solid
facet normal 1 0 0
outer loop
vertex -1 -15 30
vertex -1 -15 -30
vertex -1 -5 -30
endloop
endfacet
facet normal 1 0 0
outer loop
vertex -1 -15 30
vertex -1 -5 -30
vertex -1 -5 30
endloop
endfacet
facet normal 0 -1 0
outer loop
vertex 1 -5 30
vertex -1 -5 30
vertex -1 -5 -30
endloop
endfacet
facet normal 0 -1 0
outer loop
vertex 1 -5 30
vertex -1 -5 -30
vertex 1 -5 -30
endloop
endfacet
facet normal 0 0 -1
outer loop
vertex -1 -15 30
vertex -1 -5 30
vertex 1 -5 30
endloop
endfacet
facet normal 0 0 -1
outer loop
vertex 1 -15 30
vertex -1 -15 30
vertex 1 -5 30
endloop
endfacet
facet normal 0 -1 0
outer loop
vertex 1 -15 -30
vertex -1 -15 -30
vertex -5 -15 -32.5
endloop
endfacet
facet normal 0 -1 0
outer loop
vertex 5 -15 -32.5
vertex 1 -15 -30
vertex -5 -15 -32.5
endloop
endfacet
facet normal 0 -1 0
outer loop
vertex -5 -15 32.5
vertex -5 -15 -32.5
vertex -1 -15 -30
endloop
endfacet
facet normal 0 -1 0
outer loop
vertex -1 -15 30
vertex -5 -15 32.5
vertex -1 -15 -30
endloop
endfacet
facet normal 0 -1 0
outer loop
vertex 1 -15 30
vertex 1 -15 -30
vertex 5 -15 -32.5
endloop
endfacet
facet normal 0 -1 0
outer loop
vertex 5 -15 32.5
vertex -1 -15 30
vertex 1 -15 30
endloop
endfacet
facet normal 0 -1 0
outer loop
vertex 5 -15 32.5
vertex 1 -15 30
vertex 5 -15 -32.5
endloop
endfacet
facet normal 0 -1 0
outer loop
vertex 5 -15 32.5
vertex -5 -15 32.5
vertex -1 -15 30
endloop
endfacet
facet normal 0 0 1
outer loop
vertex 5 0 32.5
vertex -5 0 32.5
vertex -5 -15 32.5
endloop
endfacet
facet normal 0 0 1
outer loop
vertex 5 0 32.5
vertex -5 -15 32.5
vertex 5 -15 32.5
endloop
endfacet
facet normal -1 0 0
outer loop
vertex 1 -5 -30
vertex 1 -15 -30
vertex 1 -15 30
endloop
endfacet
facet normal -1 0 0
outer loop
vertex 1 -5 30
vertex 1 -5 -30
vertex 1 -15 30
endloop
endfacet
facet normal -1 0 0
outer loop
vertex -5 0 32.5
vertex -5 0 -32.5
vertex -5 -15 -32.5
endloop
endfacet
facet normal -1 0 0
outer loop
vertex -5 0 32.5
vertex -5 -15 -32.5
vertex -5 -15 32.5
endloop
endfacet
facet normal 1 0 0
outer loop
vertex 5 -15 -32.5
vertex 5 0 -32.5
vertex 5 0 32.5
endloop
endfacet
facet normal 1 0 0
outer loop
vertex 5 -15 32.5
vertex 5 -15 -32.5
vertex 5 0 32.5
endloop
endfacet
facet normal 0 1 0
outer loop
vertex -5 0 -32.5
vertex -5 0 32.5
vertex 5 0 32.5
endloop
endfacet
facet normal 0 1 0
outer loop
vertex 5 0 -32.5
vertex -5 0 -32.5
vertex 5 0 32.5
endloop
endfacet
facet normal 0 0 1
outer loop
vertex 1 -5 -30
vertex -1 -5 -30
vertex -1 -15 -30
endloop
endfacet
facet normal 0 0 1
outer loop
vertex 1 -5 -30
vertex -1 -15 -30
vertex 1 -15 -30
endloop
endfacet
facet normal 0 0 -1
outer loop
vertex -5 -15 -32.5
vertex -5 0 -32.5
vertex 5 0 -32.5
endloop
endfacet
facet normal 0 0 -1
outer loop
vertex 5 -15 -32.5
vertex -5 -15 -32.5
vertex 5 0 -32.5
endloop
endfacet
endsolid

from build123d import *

# Parameters (mm, degrees)
F0_W     = 10
F0_H     = 65
F1_DEPTH = 15
F2_W     = 2
F2_H     = 60
F3_DEPTH = 10


# Not quite as in the source:
# - a feature names something its author has since deleted; it is built from what else it names


with BuildPart() as f1:
    # F0 (on Front) → F1 (new body)
    with BuildSketch(Plane.XZ):
        Rectangle(F0_W, F0_H)
    extrude(amount=F1_DEPTH)

    # F2 (on face) → F3 (cut)
    with BuildSketch(Plane.XZ.offset(15)):
        Rectangle(F2_W, F2_H)
    extrude(amount=-F3_DEPTH, mode=Mode.SUBTRACT)


solid = f1.part
